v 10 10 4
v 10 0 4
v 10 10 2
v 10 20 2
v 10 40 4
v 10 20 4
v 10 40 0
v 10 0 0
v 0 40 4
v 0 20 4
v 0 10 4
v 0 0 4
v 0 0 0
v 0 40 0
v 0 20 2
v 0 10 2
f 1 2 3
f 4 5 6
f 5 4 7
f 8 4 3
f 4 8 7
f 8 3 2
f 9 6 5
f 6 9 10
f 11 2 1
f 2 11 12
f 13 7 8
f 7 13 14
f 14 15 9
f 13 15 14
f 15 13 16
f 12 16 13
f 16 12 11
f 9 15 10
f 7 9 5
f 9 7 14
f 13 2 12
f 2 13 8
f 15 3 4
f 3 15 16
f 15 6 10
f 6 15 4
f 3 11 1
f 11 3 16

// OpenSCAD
$fn=100;


difference() {
	cube([10, 40, 4]);
	translate([-1, 10, 2])  cube([14, 10, 3]);
}
